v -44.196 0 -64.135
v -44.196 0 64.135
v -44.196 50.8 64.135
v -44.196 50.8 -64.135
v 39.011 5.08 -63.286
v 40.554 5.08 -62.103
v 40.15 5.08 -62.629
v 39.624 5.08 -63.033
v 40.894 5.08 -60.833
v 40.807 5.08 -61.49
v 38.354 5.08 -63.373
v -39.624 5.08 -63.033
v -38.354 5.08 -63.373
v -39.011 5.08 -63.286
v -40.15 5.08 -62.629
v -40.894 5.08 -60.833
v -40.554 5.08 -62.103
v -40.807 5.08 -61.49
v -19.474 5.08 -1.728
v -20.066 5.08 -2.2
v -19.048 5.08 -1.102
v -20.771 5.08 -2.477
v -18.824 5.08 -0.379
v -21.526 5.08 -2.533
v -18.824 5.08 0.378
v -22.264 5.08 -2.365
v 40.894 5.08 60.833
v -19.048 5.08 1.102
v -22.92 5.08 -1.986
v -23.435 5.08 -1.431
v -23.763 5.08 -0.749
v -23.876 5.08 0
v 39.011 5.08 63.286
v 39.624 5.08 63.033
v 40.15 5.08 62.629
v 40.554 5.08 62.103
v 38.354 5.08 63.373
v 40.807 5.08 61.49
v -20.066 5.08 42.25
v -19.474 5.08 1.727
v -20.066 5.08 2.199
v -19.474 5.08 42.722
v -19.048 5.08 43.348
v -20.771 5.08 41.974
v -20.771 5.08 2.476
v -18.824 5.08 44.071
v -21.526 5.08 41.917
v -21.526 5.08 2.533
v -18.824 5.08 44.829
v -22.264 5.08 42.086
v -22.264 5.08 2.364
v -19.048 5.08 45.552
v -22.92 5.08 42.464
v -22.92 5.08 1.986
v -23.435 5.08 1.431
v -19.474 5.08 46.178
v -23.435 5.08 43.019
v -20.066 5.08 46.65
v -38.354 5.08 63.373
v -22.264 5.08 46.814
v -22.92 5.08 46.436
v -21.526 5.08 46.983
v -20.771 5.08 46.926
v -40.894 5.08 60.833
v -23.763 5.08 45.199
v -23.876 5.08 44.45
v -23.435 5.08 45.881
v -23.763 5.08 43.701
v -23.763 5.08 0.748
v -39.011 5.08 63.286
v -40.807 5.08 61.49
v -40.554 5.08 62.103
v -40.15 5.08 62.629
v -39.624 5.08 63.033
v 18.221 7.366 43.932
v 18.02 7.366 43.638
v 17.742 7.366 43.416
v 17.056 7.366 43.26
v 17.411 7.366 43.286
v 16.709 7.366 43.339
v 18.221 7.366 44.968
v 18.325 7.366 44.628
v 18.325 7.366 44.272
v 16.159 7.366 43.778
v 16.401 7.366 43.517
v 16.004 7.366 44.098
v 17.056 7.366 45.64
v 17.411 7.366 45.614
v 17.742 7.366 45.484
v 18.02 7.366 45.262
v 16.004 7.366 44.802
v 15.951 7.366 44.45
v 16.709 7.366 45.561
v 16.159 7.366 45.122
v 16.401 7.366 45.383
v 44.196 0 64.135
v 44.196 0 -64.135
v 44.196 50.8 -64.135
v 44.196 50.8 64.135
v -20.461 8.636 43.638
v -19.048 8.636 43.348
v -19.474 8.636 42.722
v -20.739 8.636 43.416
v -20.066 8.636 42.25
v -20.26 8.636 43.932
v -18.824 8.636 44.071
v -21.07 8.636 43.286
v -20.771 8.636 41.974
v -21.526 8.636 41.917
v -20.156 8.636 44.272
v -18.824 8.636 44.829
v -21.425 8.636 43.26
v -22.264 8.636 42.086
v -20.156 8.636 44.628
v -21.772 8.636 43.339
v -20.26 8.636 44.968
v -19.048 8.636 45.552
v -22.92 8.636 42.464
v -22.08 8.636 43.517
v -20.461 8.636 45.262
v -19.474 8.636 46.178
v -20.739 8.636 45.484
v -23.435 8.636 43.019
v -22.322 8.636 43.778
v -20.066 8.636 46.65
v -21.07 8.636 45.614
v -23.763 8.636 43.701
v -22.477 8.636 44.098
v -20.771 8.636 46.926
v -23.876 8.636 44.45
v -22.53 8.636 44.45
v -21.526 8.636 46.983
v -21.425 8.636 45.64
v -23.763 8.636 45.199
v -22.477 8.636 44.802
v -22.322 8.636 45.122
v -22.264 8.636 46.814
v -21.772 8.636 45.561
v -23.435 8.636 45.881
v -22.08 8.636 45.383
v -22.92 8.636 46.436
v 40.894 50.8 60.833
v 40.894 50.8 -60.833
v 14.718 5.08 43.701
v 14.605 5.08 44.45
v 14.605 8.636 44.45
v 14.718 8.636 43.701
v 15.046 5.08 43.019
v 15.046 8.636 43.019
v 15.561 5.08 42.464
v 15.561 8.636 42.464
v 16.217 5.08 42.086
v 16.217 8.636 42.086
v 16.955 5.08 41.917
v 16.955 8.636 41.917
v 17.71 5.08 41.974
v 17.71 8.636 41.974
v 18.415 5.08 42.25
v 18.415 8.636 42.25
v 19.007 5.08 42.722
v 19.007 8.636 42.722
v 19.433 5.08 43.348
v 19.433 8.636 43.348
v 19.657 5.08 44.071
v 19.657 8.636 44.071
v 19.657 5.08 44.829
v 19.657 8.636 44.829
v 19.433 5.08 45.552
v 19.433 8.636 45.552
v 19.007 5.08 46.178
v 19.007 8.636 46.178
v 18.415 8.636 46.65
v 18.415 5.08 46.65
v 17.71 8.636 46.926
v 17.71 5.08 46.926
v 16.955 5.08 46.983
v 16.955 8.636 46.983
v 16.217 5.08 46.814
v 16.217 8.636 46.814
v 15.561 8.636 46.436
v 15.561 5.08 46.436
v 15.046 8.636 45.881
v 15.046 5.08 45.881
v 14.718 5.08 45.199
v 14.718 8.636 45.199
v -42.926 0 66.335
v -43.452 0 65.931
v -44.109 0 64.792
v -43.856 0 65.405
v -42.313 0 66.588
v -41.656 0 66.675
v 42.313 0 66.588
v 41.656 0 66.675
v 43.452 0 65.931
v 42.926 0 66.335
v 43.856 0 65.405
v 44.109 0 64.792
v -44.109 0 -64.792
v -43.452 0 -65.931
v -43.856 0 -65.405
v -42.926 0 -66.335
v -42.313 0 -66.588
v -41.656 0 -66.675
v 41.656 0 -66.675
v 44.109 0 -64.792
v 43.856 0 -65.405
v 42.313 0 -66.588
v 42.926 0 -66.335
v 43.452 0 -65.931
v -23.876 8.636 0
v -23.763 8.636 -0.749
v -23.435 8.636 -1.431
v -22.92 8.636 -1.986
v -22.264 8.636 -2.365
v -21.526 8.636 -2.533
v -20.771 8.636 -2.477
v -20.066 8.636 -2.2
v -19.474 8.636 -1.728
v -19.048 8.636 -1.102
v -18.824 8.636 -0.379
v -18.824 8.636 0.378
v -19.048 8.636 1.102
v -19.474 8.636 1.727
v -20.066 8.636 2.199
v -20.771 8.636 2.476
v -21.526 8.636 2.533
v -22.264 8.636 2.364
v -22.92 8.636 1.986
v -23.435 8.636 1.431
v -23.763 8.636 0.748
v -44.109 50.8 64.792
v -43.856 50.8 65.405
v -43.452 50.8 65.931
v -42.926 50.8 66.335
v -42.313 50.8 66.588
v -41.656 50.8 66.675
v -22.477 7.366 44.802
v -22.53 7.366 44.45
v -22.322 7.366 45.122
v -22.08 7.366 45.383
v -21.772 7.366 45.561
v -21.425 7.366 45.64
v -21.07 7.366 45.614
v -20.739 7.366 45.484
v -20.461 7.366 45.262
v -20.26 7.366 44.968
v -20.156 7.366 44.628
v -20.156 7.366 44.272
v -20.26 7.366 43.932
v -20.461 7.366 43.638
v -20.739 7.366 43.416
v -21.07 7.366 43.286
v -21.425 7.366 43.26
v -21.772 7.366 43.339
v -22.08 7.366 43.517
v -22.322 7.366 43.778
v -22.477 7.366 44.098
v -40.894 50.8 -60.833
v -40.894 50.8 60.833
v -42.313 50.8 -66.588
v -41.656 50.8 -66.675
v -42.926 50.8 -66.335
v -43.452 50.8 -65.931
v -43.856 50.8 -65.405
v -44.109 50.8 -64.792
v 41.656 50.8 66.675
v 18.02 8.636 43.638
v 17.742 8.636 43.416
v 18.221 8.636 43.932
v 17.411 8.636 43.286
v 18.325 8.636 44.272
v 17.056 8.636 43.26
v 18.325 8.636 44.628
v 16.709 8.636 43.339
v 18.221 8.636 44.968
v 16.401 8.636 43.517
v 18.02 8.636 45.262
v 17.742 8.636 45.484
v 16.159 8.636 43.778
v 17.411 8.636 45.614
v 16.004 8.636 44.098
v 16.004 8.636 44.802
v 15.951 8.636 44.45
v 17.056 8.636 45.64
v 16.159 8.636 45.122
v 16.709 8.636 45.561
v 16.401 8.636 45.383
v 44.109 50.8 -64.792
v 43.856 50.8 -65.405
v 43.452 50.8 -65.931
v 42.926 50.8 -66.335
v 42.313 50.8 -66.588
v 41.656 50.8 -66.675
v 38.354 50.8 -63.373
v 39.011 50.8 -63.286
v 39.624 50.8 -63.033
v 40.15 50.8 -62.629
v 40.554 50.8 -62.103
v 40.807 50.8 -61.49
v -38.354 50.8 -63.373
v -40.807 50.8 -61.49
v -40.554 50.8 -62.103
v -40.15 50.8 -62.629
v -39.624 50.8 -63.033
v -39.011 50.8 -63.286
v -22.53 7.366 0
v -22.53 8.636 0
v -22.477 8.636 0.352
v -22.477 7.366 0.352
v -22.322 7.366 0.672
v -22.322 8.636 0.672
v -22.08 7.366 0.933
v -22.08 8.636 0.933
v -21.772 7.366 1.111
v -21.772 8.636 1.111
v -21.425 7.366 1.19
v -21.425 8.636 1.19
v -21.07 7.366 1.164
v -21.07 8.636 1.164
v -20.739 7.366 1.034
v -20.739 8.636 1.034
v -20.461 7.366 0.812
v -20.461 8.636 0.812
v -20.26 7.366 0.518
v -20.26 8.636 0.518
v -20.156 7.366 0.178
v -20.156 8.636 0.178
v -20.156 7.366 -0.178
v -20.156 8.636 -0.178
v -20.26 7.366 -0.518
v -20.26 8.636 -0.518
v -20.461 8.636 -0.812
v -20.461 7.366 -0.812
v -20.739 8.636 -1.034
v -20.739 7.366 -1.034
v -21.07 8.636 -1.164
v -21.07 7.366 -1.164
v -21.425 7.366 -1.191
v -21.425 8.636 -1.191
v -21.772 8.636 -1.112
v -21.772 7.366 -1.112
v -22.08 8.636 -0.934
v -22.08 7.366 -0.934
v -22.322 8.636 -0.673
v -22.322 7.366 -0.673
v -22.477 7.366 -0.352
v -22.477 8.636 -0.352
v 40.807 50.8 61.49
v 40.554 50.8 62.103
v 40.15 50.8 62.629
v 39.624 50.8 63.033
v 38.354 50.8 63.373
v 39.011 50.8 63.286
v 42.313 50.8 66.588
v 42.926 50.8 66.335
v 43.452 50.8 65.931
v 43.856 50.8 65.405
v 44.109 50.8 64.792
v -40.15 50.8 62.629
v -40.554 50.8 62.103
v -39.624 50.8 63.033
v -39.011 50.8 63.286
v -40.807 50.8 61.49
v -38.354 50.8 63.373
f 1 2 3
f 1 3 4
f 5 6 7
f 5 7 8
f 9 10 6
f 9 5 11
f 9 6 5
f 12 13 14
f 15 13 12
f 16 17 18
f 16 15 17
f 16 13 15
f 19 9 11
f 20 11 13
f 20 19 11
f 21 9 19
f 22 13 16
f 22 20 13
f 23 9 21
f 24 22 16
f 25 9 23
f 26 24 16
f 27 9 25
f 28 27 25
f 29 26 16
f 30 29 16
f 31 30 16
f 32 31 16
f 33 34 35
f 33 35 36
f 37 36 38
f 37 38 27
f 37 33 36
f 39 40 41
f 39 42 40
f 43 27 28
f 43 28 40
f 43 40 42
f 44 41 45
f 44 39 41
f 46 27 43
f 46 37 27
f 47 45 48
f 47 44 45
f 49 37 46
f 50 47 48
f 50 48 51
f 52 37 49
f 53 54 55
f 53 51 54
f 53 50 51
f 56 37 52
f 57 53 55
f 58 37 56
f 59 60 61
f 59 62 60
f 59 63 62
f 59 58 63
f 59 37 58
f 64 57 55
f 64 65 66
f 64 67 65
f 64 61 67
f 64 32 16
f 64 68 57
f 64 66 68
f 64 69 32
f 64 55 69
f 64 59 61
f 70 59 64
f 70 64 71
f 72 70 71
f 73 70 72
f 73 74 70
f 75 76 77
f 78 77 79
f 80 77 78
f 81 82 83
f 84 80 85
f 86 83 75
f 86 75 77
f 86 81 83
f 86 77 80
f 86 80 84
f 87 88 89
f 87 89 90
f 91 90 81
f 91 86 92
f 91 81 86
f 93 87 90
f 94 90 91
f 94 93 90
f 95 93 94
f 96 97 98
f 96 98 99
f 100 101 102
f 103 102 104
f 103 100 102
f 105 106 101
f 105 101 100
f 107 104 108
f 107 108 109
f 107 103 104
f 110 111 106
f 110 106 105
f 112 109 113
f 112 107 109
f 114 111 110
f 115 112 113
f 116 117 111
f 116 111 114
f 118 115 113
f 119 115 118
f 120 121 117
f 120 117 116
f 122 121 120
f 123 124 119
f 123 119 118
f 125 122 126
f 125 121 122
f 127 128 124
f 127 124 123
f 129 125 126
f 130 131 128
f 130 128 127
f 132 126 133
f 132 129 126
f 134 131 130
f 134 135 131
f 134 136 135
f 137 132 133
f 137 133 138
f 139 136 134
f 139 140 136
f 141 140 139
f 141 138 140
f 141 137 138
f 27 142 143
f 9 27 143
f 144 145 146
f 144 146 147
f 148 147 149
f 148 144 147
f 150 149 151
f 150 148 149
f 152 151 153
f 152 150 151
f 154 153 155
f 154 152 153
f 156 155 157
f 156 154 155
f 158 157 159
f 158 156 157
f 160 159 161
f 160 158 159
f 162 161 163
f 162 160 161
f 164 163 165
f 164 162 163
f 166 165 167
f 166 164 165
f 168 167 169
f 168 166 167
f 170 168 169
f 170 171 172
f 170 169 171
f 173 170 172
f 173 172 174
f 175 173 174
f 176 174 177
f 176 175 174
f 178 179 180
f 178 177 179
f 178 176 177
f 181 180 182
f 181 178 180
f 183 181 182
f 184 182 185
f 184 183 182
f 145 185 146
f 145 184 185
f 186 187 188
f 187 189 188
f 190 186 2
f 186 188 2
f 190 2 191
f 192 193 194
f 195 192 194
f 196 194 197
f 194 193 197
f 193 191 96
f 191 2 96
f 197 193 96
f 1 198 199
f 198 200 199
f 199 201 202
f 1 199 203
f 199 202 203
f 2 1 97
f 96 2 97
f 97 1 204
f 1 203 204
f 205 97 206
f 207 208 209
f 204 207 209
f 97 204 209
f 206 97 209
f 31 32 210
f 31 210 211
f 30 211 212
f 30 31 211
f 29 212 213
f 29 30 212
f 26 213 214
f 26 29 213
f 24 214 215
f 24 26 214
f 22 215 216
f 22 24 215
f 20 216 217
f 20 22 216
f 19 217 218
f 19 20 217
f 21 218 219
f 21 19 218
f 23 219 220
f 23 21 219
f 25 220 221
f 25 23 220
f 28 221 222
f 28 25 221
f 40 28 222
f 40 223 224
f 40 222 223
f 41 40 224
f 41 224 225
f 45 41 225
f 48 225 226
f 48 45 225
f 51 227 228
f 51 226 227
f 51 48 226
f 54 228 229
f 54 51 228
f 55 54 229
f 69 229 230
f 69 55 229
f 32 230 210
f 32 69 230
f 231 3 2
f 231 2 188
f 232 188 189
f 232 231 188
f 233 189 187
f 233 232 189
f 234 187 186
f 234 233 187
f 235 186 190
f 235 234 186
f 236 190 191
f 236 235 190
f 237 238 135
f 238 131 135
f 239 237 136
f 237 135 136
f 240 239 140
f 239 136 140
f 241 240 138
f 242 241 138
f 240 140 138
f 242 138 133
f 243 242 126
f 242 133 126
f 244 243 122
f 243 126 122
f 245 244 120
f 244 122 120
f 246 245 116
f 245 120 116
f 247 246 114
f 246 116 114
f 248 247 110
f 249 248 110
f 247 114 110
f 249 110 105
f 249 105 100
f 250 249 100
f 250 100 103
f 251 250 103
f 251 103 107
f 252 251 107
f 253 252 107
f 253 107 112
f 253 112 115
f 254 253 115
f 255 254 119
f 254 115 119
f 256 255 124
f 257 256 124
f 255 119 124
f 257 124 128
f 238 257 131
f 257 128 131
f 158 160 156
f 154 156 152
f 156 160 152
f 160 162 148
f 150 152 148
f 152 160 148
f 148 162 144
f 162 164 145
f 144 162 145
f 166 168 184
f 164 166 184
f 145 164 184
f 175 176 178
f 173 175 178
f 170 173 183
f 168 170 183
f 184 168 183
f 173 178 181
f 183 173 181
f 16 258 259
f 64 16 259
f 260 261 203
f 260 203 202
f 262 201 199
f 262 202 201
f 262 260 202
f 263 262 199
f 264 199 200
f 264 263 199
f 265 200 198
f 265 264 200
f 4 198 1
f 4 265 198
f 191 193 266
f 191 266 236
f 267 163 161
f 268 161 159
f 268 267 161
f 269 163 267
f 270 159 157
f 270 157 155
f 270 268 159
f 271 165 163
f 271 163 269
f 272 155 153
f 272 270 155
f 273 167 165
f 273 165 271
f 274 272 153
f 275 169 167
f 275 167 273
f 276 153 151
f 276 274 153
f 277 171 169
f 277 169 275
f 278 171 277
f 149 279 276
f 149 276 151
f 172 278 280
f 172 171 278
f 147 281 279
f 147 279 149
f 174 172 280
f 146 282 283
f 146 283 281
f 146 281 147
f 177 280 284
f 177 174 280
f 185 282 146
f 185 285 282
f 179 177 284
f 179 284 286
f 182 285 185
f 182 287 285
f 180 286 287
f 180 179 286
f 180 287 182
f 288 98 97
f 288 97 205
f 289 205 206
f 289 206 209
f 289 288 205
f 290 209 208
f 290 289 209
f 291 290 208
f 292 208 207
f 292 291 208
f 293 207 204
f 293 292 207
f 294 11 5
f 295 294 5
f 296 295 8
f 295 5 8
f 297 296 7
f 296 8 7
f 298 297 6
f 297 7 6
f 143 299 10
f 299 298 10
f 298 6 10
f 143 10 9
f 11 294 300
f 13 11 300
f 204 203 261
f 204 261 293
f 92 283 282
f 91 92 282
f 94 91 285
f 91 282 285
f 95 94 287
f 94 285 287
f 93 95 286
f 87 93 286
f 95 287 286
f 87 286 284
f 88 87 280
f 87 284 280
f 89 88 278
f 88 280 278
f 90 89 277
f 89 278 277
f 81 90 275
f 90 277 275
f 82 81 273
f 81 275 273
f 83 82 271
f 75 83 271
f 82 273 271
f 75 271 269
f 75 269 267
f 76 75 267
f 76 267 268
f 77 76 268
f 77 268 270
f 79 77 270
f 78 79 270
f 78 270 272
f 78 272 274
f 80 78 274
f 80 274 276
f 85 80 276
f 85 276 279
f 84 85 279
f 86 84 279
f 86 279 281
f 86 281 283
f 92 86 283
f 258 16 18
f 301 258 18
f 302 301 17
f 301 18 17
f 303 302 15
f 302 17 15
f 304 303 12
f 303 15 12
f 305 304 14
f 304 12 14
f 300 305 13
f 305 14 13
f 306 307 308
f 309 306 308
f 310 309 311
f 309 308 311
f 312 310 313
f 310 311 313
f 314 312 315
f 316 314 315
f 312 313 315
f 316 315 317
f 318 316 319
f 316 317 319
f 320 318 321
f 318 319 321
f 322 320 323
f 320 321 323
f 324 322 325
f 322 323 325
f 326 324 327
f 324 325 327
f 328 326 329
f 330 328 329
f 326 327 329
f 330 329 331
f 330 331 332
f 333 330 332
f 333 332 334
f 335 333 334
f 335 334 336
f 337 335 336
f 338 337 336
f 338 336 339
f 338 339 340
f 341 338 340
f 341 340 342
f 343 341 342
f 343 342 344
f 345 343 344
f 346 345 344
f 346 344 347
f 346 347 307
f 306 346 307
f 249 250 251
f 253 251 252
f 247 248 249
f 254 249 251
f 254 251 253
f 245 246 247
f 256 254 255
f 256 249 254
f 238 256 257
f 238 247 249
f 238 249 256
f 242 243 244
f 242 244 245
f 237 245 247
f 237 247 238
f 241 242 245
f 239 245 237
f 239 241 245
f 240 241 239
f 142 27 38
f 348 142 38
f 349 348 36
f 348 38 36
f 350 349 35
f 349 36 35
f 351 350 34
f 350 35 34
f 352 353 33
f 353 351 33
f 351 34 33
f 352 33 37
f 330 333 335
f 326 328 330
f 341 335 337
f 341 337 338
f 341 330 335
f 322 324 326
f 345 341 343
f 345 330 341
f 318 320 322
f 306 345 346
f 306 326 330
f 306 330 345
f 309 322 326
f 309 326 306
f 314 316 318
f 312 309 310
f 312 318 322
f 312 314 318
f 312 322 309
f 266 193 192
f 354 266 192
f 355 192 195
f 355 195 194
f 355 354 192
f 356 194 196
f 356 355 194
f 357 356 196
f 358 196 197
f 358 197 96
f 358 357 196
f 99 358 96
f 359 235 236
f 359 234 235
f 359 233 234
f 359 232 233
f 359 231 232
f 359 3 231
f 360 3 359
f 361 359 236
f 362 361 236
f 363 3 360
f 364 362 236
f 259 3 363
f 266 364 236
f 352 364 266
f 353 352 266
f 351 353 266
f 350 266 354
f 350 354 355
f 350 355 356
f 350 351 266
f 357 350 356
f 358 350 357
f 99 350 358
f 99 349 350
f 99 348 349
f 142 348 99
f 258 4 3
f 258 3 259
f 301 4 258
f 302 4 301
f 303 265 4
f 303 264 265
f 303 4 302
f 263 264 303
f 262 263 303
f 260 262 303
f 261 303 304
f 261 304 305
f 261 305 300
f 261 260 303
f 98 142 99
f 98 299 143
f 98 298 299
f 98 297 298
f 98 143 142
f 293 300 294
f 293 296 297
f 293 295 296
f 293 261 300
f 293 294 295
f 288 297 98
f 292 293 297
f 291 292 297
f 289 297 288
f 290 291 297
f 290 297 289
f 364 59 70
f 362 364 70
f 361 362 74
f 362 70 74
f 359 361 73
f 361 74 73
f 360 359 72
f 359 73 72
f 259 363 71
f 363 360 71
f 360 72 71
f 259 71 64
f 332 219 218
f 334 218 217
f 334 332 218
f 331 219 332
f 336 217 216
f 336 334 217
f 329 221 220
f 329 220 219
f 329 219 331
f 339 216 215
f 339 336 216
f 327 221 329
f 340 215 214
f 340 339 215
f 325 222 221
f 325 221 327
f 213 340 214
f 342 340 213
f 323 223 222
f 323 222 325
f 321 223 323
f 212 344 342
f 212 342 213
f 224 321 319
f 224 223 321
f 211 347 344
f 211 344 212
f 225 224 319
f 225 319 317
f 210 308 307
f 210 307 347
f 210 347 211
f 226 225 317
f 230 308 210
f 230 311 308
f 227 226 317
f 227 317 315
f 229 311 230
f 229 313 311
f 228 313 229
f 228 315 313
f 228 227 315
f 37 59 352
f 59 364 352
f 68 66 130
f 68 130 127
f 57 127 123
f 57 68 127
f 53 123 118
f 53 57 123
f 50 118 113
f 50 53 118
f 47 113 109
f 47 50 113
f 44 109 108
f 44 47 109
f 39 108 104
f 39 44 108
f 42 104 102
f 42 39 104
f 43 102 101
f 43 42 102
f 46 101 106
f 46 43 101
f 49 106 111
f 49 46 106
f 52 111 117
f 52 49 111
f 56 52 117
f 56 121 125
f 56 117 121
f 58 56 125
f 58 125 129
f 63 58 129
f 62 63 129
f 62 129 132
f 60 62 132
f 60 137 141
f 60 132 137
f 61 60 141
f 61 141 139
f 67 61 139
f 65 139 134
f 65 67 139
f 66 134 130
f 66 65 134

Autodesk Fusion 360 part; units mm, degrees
sketch "Sketch1" plane through (0, 0, 0) normal (0, 1, 0) x (1, 0, 0) in component "Case"
  line L0 (44.196, -66.675) -> (-44.196, -66.675)
  line L1 (-44.196, -66.675) -> (-44.196, 66.675)
  line L2 (-44.196, 66.675) -> (44.196, 66.675)
  line L3 (44.196, 66.675) -> (44.196, -66.675)
  line L4 (44.196, -66.675) -> (-44.196, 66.675) construction
  line L5 (-44.196, -66.675) -> (44.196, 66.675) construction
  dimension "d1" = 133.35
  dimension "d2" = 88.392
extrude "Extrude1" add sketch "Sketch1" along normal blind 50.8 makes body 1 in component "Case"
sketch "Sketch2" plane through (0, 50.8, 0) normal (0, 1, 0) x (-1, 0, 0) in component "Case"
  line L0 (-44.196, -66.675) -> (44.196, -66.675)
  line L1 (44.196, -66.675) -> (44.196, 66.675)
  line L2 (44.196, 66.675) -> (-44.196, 66.675)
  line L3 (-44.196, 66.675) -> (-44.196, -66.675)
sketch "Sketch3" plane through (0, 50.8, 0) normal (0, 1, 0) x (-1, 0, 0) in component "Case"
  line L0 (40.894, 63.373) -> (-40.894, 63.373)
  line L1 (-40.894, 63.373) -> (-40.894, -63.373)
  line L2 (-40.894, -63.373) -> (40.894, -63.373)
  line L3 (40.894, -63.373) -> (40.894, 63.373)
  line L4 (40.894, 63.373) -> (-40.894, -63.373) construction
  line L5 (-40.894, 63.373) -> (40.894, -63.373) construction
  dimension "d5" = 81.788
  dimension "d6" = 126.746
extrude "Extrude2" cut sketch "Sketch3" against normal blind 45.72 bodies 1 in component "Case"
fillet "Fillet1" radius 2.54 8 edges at (44.196, 25.4, 66.675) (-44.196, 25.4, 66.675) (40.894, 27.94, -63.373) (-40.894, 27.94, -63.373) (-44.196, 25.4, -66.675) (40.894, 27.94, 63.373) (-40.894, 27.94, 63.373) (44.196, 25.4, -66.675) on bodies 1 in component "Case"
sketch "Sketch5" plane through (0, 5.08, 0) normal (0, 1, 0) x (-1, 0, 0) in component "Case"
  circle A0 centre (-17.145, -22.225) radius 2.54
  circle A1 centre (-17.145, 22.225) radius 2.54
  circle A2 centre (21.336, 22.225) radius 2.54
  arc A3 (40.894, 60.833) -> (38.354, 63.373) centre (38.354, 60.833) ccw
  line L0 (38.354, 63.373) -> (-38.354, 63.373)
  arc A4 (-38.354, 63.373) -> (-40.894, 60.833) centre (-38.354, 60.833) ccw
  line L1 (-40.894, 60.833) -> (-40.894, -60.833)
  arc A5 (-40.894, -60.833) -> (-38.354, -63.373) centre (-38.354, -60.833) ccw
  line L2 (-38.354, -63.373) -> (38.354, -63.373)
  arc A6 (38.354, -63.373) -> (40.894, -60.833) centre (38.354, -60.833) ccw
  line L3 (40.894, -60.833) -> (40.894, 60.833)
  dimension "d19" = 5.08
  dimension "d20" = 5.08
  dimension "d21" = 5.08
  dimension "d22" = 17.145
  dimension "d23" = 17.145
  dimension "d24" = 21.336
  dimension "d25" = 22.225
  dimension "d26" = 22.225
  dimension "d27" = 22.225
sketch "Sketch6" plane through (0, 5.08, 0) normal (0, 1, 0) x (-1, 0, 0) in component "Case"
  circle A0 centre (-17.145, 44.45) radius 2.54
  arc A1 (40.894, 60.833) -> (38.354, 63.373) centre (38.354, 60.833) ccw
  line L0 (38.354, 63.373) -> (-38.354, 63.373)
  arc A2 (-38.354, 63.373) -> (-40.894, 60.833) centre (-38.354, 60.833) ccw
  line L1 (-40.894, 60.833) -> (-40.894, -60.833)
  arc A3 (-40.894, -60.833) -> (-38.354, -63.373) centre (-38.354, -60.833) ccw
  line L2 (-38.354, -63.373) -> (38.354, -63.373)
  arc A4 (38.354, -63.373) -> (40.894, -60.833) centre (38.354, -60.833) ccw
  line L3 (40.894, -60.833) -> (40.894, 60.833)
  dimension "d30" = 5.08
  dimension "d31" = 17.145
  dimension "d32" = 44.45
extrude "Extrude4" add sketch "Sketch6" along normal blind 3.556 separate body contours A0 makes body 2 in component "Case"
sketch "Sketch7" plane through (0, 5.08, 0) normal (0, 1, 0) x (-1, 0, 0) in component "Case"
  arc A0 (40.894, 60.833) -> (38.354, 63.373) centre (38.354, 60.833) ccw
  line L0 (38.354, 63.373) -> (-38.354, 63.373)
  arc A1 (-38.354, 63.373) -> (-40.894, 60.833) centre (-38.354, 60.833) ccw
  line L1 (-40.894, 60.833) -> (-40.894, -60.833)
  arc A2 (-40.894, -60.833) -> (-38.354, -63.373) centre (-38.354, -60.833) ccw
  line L2 (-38.354, -63.373) -> (38.354, -63.373)
  arc A3 (38.354, -63.373) -> (40.894, -60.833) centre (38.354, -60.833) ccw
  line L3 (40.894, -60.833) -> (40.894, 60.833)
  circle A4 centre (21.336, 44.45) radius 2.54
  dimension "d35" = 5.08
  dimension "d36" = 21.336
  dimension "d37" = 44.45
extrude "Extrude5" add sketch "Sketch7" along normal blind 3.556 contours A4 bodies 1 in component "Case"
sketch "Sketch8" plane through (0, 5.08, 0) normal (0, 1, 0) x (-1, 0, 0) in component "Case"
  circle A0 centre (21.336, 44.45) radius 2.54
  arc A1 (40.894, 60.833) -> (38.354, 63.373) centre (38.354, 60.833) ccw
  line L0 (38.354, 63.373) -> (-38.354, 63.373)
  arc A2 (-38.354, 63.373) -> (-40.894, 60.833) centre (-38.354, 60.833) ccw
  line L1 (-40.894, 60.833) -> (-40.894, -60.833)
  arc A3 (-40.894, -60.833) -> (-38.354, -63.373) centre (-38.354, -60.833) ccw
  line L2 (-38.354, -63.373) -> (38.354, -63.373)
  arc A4 (38.354, -63.373) -> (40.894, -60.833) centre (38.354, -60.833) ccw
  line L3 (40.894, -60.833) -> (40.894, 60.833)
  circle A5 centre (21.336, -0.0003) radius 2.54
  dimension "d40" = 5.08
  dimension "d41" = 0.0003
  dimension "d54" = 21.336
extrude "Extrude6" add sketch "Sketch8" along normal blind 3.556 contours A5 bodies 1 in component "Case"
sketch "Sketch9" plane through (0, 8.636, 0) normal (0, 1, 0) x (-1, 0, 0) in component "Case"
  circle A0 centre (-17.145, 44.45) radius 2.54
  circle A1 centre (-17.145, 44.45) radius 1.1938
  dimension "d45" = 2.3876
extrude "Extrude7" cut sketch "Sketch9" against normal blind 1.27 contours A1 bodies 2 in component "Case"
sketch "Sketch10" plane through (0, 8.636, 0) normal (0, 1, 0) x (-1, 0, 0) in component "Case"
  circle A0 centre (21.336, 44.45) radius 2.54
  circle A1 centre (21.336, 44.45) radius 1.1938
  dimension "d48" = 2.3876
extrude "Extrude8" cut sketch "Sketch10" against normal blind 1.27 contours A1 bodies 1 in component "Case"
sketch "Sketch11" plane through (0, 8.636, 0) normal (0, 1, 0) x (-1, 0, 0) in component "Case"
  circle A0 centre (21.336, -0.0003) radius 2.54
  circle A1 centre (21.336, -0.0003) radius 1.1938
  dimension "d51" = 2.3876
extrude "Extrude9" cut sketch "Sketch11" against normal blind 1.27 contours A1 bodies 1 in component "Case"
component "Case" placed x (1, 0, 0) y (0, 1, 0) z (0, 0, 1) at (0, 0, 0)
